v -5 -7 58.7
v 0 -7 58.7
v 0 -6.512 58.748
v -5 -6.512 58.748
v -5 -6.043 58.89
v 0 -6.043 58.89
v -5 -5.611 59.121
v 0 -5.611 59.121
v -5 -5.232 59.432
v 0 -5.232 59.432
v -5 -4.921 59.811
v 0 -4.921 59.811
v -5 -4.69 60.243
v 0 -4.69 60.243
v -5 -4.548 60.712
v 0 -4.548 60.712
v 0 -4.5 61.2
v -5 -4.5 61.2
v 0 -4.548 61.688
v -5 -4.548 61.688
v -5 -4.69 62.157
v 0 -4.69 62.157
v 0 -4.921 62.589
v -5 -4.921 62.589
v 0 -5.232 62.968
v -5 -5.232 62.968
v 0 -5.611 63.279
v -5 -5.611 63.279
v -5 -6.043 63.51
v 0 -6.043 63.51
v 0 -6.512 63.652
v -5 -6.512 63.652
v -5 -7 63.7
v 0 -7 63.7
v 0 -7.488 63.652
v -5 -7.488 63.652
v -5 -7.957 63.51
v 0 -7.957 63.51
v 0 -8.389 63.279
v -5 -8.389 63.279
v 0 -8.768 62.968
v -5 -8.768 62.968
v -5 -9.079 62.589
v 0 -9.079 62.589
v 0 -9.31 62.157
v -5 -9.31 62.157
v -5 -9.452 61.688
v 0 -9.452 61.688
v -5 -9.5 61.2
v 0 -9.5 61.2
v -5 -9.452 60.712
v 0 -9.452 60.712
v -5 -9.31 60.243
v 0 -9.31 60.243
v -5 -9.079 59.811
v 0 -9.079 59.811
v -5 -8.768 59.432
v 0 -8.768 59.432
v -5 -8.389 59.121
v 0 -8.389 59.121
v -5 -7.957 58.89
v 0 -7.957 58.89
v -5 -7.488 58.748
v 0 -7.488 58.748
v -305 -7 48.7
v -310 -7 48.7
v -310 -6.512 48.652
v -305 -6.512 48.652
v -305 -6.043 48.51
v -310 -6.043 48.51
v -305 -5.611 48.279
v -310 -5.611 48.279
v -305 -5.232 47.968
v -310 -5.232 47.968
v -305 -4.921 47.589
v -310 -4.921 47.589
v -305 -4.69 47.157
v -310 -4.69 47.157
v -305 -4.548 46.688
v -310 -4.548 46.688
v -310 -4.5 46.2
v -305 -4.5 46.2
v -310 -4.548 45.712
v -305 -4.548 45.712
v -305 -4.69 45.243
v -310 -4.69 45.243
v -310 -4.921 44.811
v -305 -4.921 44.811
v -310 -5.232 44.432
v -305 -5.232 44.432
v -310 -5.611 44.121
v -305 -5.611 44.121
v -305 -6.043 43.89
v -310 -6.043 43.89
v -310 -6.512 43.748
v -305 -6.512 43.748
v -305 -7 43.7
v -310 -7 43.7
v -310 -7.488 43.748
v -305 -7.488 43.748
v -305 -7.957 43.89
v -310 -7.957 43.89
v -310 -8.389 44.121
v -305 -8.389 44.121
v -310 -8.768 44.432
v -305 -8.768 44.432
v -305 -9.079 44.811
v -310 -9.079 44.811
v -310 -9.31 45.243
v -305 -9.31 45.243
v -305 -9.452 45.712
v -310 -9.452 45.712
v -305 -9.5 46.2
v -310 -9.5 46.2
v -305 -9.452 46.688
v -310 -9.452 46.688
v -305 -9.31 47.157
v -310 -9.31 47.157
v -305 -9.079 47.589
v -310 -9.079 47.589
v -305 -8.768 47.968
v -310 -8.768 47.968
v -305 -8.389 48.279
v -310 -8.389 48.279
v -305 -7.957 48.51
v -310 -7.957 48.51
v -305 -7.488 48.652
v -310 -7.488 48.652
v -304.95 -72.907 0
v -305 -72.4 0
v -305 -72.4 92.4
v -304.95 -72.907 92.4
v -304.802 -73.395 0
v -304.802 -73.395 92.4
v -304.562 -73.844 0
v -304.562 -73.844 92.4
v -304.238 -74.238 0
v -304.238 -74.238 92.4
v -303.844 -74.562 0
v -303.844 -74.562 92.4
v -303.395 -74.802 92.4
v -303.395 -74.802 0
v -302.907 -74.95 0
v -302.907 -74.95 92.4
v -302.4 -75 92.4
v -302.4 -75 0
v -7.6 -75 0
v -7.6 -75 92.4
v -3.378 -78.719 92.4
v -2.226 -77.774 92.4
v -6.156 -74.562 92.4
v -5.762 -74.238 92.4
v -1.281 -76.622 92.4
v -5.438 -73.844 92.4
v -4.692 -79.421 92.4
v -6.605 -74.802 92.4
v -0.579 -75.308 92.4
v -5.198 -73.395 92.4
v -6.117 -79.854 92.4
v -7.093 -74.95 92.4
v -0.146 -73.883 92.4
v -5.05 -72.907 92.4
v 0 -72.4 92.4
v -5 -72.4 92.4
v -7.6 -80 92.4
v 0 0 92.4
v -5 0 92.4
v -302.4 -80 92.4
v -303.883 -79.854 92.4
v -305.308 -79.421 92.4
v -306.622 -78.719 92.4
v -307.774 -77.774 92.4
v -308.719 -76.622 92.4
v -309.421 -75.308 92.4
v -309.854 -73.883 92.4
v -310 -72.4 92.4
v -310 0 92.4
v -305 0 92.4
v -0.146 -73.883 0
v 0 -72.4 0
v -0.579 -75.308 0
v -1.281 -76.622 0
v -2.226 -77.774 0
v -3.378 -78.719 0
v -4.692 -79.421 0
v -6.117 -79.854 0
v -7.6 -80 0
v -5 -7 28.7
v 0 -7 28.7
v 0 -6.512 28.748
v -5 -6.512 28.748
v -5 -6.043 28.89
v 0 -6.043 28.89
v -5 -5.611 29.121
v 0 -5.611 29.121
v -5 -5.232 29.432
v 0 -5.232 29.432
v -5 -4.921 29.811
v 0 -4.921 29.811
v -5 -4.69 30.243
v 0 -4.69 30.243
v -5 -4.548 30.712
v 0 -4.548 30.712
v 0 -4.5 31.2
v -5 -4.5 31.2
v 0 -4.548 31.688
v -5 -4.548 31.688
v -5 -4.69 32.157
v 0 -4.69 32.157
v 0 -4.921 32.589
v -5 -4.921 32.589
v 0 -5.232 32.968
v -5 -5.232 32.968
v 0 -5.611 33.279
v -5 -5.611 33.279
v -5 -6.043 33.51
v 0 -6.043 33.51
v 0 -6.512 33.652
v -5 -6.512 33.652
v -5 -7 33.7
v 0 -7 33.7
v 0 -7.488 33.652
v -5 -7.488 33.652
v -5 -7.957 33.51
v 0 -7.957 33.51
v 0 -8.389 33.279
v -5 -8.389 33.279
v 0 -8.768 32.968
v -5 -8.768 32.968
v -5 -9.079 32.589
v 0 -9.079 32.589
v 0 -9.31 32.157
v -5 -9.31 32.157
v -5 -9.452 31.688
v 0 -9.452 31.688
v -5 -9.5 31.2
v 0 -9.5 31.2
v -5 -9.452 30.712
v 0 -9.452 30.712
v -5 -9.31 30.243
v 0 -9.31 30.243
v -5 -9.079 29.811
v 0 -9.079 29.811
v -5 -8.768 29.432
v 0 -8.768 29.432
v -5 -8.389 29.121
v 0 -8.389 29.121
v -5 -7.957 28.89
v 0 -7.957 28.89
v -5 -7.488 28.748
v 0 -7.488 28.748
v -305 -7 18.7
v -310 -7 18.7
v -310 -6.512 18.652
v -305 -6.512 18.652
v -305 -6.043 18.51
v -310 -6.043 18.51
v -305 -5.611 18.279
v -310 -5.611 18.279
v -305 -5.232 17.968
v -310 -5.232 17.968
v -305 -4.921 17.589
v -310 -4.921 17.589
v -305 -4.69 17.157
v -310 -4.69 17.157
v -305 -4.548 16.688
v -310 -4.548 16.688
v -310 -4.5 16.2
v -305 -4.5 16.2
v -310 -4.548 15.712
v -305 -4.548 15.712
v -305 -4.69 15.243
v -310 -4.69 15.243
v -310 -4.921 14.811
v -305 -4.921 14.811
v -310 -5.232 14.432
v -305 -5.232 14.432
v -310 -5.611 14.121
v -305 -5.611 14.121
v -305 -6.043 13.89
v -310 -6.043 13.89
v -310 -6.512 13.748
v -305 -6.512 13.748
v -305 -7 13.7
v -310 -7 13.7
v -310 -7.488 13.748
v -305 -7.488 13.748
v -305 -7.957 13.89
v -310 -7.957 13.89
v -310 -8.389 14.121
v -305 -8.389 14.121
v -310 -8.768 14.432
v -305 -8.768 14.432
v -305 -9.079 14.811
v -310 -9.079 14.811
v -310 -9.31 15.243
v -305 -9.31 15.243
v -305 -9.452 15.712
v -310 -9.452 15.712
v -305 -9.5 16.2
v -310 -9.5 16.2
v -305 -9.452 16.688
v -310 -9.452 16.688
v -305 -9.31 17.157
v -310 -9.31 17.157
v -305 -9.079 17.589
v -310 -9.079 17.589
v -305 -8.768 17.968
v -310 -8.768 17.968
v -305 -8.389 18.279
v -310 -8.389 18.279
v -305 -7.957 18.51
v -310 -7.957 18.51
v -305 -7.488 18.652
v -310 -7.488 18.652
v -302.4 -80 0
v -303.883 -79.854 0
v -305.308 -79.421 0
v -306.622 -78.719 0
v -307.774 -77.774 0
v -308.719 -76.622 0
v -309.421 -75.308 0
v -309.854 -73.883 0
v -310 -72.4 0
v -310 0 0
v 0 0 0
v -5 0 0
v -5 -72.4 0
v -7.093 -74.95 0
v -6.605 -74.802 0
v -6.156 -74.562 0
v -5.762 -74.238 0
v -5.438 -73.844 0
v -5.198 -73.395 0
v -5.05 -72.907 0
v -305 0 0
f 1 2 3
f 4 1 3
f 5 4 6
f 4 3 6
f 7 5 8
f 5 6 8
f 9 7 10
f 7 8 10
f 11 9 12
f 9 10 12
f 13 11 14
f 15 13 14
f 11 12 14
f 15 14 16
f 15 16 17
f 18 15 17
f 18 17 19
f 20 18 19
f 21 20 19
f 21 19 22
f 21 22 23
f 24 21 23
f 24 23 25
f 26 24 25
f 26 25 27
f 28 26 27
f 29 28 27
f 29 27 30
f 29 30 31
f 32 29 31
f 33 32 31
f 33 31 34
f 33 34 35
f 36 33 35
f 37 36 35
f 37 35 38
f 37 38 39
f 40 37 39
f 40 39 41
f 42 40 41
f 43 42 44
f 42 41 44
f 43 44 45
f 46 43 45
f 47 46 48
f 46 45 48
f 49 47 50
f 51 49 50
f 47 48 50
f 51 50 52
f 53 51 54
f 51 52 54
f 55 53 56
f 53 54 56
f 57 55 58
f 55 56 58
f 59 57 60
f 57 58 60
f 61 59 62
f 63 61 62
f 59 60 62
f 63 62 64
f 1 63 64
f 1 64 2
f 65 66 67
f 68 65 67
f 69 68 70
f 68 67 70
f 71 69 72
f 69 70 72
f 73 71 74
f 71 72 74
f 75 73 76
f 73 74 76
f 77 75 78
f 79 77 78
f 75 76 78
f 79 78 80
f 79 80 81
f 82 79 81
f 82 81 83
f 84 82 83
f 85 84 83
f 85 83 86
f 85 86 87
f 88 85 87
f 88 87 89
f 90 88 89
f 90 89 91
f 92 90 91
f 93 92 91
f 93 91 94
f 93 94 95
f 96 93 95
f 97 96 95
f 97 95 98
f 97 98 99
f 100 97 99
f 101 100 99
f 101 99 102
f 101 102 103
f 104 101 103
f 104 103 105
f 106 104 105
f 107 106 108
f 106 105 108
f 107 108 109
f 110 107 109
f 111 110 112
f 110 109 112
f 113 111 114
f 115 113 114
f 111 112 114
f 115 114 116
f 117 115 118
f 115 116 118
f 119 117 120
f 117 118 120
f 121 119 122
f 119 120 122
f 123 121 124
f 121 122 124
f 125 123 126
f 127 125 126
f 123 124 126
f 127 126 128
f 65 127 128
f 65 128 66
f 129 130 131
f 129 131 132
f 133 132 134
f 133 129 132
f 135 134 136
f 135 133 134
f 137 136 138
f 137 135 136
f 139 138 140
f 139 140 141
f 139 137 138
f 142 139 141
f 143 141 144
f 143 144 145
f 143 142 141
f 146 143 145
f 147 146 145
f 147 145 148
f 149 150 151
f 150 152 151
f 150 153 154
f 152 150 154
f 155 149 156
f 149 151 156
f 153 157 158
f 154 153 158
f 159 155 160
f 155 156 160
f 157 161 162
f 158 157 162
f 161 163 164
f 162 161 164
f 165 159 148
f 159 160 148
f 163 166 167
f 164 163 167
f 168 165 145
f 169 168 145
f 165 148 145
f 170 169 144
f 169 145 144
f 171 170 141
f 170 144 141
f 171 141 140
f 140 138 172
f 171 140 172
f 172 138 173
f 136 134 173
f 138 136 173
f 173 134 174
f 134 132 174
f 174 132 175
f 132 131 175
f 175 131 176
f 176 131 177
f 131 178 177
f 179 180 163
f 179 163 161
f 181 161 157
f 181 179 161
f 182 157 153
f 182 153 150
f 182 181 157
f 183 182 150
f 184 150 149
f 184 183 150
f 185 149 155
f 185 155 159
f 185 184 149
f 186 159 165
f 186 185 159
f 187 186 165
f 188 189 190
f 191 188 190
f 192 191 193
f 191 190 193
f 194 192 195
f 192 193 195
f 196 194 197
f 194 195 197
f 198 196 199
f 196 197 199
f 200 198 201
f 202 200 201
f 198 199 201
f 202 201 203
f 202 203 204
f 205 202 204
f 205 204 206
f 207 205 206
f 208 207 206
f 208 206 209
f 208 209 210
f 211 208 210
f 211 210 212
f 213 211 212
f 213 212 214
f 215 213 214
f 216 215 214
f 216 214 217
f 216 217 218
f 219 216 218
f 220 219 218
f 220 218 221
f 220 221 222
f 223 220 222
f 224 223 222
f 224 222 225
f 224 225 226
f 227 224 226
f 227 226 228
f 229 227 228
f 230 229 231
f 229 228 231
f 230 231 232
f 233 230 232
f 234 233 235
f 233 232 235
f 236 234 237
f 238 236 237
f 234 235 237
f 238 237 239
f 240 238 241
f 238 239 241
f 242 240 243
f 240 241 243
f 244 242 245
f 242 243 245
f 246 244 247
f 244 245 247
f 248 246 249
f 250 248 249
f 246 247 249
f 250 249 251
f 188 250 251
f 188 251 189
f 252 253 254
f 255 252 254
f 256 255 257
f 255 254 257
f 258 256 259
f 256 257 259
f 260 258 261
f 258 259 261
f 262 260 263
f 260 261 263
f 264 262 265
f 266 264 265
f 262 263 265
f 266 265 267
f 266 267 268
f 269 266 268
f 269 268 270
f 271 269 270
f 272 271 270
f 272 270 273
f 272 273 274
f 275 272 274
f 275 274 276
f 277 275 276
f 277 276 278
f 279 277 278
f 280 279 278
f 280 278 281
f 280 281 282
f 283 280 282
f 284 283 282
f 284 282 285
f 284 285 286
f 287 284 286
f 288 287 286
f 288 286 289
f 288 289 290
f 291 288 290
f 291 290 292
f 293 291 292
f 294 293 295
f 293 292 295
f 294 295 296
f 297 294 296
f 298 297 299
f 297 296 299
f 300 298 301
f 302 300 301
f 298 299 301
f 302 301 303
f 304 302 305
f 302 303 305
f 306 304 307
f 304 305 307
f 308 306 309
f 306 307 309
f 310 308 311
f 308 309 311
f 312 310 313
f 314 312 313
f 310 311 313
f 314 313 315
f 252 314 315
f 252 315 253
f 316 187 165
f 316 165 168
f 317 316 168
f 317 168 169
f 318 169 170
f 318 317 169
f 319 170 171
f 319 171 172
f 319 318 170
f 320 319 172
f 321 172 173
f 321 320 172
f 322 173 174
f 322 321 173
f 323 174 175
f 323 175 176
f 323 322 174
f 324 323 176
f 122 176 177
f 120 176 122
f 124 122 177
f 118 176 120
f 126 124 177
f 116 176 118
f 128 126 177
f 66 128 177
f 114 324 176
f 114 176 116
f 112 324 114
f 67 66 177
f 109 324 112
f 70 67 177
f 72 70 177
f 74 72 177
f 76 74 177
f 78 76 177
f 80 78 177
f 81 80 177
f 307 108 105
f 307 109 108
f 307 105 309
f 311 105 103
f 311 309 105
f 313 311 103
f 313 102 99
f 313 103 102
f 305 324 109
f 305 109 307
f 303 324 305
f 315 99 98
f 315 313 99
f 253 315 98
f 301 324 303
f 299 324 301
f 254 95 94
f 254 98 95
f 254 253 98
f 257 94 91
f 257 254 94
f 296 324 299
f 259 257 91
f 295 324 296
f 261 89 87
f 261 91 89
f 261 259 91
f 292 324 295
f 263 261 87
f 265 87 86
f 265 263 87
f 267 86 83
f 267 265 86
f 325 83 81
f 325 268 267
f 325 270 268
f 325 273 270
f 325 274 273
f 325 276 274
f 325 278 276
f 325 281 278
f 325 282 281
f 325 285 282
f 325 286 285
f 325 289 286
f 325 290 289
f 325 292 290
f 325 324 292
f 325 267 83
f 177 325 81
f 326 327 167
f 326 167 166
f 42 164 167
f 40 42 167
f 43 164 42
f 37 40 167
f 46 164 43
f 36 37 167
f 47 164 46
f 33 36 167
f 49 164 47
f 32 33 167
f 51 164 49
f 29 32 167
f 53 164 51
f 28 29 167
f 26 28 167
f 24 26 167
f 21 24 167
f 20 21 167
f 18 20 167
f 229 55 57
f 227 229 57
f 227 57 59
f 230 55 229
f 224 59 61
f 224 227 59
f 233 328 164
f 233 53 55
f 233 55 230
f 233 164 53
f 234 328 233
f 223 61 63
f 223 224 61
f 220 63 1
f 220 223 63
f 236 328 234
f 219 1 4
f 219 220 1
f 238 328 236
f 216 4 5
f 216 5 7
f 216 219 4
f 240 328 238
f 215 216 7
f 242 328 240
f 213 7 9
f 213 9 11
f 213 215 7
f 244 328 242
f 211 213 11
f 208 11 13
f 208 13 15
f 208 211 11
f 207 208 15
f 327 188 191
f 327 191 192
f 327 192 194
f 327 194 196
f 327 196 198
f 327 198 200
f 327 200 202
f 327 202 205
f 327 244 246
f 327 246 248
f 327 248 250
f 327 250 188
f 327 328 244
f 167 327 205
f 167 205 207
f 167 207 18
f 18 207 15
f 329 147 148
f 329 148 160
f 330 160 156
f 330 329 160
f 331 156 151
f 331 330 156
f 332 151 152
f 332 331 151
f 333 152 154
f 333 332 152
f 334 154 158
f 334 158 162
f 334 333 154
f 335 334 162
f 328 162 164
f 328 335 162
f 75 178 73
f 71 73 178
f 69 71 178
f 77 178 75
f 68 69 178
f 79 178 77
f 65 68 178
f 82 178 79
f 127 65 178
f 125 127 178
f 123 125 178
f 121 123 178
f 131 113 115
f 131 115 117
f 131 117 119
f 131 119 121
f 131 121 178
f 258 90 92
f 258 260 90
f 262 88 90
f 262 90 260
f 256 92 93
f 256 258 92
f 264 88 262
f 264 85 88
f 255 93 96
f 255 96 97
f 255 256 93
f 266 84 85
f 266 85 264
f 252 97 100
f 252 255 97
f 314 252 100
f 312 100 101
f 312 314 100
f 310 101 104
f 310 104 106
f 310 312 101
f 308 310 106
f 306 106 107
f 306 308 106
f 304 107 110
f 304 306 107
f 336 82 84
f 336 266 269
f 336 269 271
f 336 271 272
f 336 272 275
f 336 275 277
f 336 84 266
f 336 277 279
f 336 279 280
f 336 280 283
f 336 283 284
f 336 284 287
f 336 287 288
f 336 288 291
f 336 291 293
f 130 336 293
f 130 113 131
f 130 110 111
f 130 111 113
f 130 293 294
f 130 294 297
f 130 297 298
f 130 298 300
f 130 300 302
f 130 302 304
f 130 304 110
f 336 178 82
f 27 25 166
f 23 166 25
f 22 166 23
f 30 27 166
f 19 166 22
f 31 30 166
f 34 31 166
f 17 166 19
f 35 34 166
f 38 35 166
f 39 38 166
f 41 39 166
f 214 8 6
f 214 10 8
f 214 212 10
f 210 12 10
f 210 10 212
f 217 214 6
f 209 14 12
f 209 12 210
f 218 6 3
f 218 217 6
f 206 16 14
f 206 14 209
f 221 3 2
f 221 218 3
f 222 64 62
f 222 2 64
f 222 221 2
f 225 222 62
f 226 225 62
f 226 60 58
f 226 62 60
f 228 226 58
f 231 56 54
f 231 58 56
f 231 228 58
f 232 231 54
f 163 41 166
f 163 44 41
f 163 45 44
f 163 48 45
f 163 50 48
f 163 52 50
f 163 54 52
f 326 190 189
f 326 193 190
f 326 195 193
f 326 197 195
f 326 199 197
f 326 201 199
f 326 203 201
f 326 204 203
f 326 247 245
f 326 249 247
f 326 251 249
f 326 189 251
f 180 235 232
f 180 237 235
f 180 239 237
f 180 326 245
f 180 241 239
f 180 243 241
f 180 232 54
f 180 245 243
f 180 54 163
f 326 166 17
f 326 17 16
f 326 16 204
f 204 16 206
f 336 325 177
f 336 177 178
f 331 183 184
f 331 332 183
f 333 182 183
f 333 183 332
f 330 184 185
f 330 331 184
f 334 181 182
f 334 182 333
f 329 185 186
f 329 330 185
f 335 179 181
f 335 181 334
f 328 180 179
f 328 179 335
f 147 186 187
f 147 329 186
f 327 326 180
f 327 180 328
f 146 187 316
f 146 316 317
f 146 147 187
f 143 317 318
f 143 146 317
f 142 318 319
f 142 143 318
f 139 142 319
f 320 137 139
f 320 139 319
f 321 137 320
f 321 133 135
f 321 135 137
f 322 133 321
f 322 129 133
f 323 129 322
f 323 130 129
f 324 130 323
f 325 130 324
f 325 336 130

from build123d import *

# Parameters (mm, degrees)
BASE_FLANGE1_DEPTH = 92.4
SKETCH6_R          = 2.5
CUT_EXTRUDE1_DEPTH = 10
SKETCH7_R          = 2.5
CUT_EXTRUDE2_DEPTH = 10


# Sheet-metal steps are written as plain solids
with BuildPart() as part:
    # Sketch1 → Base-Flange1 (new body)
    with BuildSketch(Plane.XY):
        with BuildLine():
            Line((0, 0), (0, -72.4))
            ThreePointArc((0, -72.4), (-2.225988463, -77.774011537), (-7.6, -80))
            Line((-7.6, -80), (-130, -80))
            Line((-130, -80), (-230, -80))
            Line((-230, -80), (-302.4, -80))
            ThreePointArc((-302.4, -80), (-307.774011537, -77.774011537), (-310, -72.4))
            Line((-310, -72.4), (-310, 0))
            Line((-310, 0), (-305, 0))
            Line((-305, 0), (-305, -72.4))
            ThreePointArc((-305, -72.4), (-304.238477631, -74.238477631), (-302.4, -75))
            Line((-302.4, -75), (-230, -75))
            Line((-230, -75), (-130, -75))
            Line((-130, -75), (-7.6, -75))
            ThreePointArc((-7.6, -75), (-5.761522369, -74.238477631), (-5, -72.4))
            Line((-5, -72.4), (-5, 0))
            Line((-5, 0), (0, 0))
        make_face()
    extrude(amount=BASE_FLANGE1_DEPTH)

    # Sketch6 → Cut-Extrude1 (cut)
    with BuildSketch(Plane(origin=(0, 0, 0), x_dir=(0, 0, -1), z_dir=(1, 0, 0))):
        with Locations((-61.2, -7)):
            Circle(SKETCH6_R)
        with Locations((-31.2, -7)):
            Circle(SKETCH6_R)
    extrude(amount=-CUT_EXTRUDE1_DEPTH, mode=Mode.SUBTRACT)

    # Sketch7 → Cut-Extrude2 (cut)
    with BuildSketch(Plane.ZY.offset(310)):
        with Locations((46.2, -7)):
            Circle(SKETCH7_R)
        with Locations((16.2, -7)):
            Circle(SKETCH7_R)
    extrude(amount=-CUT_EXTRUDE2_DEPTH, mode=Mode.SUBTRACT)


solid = part.part
